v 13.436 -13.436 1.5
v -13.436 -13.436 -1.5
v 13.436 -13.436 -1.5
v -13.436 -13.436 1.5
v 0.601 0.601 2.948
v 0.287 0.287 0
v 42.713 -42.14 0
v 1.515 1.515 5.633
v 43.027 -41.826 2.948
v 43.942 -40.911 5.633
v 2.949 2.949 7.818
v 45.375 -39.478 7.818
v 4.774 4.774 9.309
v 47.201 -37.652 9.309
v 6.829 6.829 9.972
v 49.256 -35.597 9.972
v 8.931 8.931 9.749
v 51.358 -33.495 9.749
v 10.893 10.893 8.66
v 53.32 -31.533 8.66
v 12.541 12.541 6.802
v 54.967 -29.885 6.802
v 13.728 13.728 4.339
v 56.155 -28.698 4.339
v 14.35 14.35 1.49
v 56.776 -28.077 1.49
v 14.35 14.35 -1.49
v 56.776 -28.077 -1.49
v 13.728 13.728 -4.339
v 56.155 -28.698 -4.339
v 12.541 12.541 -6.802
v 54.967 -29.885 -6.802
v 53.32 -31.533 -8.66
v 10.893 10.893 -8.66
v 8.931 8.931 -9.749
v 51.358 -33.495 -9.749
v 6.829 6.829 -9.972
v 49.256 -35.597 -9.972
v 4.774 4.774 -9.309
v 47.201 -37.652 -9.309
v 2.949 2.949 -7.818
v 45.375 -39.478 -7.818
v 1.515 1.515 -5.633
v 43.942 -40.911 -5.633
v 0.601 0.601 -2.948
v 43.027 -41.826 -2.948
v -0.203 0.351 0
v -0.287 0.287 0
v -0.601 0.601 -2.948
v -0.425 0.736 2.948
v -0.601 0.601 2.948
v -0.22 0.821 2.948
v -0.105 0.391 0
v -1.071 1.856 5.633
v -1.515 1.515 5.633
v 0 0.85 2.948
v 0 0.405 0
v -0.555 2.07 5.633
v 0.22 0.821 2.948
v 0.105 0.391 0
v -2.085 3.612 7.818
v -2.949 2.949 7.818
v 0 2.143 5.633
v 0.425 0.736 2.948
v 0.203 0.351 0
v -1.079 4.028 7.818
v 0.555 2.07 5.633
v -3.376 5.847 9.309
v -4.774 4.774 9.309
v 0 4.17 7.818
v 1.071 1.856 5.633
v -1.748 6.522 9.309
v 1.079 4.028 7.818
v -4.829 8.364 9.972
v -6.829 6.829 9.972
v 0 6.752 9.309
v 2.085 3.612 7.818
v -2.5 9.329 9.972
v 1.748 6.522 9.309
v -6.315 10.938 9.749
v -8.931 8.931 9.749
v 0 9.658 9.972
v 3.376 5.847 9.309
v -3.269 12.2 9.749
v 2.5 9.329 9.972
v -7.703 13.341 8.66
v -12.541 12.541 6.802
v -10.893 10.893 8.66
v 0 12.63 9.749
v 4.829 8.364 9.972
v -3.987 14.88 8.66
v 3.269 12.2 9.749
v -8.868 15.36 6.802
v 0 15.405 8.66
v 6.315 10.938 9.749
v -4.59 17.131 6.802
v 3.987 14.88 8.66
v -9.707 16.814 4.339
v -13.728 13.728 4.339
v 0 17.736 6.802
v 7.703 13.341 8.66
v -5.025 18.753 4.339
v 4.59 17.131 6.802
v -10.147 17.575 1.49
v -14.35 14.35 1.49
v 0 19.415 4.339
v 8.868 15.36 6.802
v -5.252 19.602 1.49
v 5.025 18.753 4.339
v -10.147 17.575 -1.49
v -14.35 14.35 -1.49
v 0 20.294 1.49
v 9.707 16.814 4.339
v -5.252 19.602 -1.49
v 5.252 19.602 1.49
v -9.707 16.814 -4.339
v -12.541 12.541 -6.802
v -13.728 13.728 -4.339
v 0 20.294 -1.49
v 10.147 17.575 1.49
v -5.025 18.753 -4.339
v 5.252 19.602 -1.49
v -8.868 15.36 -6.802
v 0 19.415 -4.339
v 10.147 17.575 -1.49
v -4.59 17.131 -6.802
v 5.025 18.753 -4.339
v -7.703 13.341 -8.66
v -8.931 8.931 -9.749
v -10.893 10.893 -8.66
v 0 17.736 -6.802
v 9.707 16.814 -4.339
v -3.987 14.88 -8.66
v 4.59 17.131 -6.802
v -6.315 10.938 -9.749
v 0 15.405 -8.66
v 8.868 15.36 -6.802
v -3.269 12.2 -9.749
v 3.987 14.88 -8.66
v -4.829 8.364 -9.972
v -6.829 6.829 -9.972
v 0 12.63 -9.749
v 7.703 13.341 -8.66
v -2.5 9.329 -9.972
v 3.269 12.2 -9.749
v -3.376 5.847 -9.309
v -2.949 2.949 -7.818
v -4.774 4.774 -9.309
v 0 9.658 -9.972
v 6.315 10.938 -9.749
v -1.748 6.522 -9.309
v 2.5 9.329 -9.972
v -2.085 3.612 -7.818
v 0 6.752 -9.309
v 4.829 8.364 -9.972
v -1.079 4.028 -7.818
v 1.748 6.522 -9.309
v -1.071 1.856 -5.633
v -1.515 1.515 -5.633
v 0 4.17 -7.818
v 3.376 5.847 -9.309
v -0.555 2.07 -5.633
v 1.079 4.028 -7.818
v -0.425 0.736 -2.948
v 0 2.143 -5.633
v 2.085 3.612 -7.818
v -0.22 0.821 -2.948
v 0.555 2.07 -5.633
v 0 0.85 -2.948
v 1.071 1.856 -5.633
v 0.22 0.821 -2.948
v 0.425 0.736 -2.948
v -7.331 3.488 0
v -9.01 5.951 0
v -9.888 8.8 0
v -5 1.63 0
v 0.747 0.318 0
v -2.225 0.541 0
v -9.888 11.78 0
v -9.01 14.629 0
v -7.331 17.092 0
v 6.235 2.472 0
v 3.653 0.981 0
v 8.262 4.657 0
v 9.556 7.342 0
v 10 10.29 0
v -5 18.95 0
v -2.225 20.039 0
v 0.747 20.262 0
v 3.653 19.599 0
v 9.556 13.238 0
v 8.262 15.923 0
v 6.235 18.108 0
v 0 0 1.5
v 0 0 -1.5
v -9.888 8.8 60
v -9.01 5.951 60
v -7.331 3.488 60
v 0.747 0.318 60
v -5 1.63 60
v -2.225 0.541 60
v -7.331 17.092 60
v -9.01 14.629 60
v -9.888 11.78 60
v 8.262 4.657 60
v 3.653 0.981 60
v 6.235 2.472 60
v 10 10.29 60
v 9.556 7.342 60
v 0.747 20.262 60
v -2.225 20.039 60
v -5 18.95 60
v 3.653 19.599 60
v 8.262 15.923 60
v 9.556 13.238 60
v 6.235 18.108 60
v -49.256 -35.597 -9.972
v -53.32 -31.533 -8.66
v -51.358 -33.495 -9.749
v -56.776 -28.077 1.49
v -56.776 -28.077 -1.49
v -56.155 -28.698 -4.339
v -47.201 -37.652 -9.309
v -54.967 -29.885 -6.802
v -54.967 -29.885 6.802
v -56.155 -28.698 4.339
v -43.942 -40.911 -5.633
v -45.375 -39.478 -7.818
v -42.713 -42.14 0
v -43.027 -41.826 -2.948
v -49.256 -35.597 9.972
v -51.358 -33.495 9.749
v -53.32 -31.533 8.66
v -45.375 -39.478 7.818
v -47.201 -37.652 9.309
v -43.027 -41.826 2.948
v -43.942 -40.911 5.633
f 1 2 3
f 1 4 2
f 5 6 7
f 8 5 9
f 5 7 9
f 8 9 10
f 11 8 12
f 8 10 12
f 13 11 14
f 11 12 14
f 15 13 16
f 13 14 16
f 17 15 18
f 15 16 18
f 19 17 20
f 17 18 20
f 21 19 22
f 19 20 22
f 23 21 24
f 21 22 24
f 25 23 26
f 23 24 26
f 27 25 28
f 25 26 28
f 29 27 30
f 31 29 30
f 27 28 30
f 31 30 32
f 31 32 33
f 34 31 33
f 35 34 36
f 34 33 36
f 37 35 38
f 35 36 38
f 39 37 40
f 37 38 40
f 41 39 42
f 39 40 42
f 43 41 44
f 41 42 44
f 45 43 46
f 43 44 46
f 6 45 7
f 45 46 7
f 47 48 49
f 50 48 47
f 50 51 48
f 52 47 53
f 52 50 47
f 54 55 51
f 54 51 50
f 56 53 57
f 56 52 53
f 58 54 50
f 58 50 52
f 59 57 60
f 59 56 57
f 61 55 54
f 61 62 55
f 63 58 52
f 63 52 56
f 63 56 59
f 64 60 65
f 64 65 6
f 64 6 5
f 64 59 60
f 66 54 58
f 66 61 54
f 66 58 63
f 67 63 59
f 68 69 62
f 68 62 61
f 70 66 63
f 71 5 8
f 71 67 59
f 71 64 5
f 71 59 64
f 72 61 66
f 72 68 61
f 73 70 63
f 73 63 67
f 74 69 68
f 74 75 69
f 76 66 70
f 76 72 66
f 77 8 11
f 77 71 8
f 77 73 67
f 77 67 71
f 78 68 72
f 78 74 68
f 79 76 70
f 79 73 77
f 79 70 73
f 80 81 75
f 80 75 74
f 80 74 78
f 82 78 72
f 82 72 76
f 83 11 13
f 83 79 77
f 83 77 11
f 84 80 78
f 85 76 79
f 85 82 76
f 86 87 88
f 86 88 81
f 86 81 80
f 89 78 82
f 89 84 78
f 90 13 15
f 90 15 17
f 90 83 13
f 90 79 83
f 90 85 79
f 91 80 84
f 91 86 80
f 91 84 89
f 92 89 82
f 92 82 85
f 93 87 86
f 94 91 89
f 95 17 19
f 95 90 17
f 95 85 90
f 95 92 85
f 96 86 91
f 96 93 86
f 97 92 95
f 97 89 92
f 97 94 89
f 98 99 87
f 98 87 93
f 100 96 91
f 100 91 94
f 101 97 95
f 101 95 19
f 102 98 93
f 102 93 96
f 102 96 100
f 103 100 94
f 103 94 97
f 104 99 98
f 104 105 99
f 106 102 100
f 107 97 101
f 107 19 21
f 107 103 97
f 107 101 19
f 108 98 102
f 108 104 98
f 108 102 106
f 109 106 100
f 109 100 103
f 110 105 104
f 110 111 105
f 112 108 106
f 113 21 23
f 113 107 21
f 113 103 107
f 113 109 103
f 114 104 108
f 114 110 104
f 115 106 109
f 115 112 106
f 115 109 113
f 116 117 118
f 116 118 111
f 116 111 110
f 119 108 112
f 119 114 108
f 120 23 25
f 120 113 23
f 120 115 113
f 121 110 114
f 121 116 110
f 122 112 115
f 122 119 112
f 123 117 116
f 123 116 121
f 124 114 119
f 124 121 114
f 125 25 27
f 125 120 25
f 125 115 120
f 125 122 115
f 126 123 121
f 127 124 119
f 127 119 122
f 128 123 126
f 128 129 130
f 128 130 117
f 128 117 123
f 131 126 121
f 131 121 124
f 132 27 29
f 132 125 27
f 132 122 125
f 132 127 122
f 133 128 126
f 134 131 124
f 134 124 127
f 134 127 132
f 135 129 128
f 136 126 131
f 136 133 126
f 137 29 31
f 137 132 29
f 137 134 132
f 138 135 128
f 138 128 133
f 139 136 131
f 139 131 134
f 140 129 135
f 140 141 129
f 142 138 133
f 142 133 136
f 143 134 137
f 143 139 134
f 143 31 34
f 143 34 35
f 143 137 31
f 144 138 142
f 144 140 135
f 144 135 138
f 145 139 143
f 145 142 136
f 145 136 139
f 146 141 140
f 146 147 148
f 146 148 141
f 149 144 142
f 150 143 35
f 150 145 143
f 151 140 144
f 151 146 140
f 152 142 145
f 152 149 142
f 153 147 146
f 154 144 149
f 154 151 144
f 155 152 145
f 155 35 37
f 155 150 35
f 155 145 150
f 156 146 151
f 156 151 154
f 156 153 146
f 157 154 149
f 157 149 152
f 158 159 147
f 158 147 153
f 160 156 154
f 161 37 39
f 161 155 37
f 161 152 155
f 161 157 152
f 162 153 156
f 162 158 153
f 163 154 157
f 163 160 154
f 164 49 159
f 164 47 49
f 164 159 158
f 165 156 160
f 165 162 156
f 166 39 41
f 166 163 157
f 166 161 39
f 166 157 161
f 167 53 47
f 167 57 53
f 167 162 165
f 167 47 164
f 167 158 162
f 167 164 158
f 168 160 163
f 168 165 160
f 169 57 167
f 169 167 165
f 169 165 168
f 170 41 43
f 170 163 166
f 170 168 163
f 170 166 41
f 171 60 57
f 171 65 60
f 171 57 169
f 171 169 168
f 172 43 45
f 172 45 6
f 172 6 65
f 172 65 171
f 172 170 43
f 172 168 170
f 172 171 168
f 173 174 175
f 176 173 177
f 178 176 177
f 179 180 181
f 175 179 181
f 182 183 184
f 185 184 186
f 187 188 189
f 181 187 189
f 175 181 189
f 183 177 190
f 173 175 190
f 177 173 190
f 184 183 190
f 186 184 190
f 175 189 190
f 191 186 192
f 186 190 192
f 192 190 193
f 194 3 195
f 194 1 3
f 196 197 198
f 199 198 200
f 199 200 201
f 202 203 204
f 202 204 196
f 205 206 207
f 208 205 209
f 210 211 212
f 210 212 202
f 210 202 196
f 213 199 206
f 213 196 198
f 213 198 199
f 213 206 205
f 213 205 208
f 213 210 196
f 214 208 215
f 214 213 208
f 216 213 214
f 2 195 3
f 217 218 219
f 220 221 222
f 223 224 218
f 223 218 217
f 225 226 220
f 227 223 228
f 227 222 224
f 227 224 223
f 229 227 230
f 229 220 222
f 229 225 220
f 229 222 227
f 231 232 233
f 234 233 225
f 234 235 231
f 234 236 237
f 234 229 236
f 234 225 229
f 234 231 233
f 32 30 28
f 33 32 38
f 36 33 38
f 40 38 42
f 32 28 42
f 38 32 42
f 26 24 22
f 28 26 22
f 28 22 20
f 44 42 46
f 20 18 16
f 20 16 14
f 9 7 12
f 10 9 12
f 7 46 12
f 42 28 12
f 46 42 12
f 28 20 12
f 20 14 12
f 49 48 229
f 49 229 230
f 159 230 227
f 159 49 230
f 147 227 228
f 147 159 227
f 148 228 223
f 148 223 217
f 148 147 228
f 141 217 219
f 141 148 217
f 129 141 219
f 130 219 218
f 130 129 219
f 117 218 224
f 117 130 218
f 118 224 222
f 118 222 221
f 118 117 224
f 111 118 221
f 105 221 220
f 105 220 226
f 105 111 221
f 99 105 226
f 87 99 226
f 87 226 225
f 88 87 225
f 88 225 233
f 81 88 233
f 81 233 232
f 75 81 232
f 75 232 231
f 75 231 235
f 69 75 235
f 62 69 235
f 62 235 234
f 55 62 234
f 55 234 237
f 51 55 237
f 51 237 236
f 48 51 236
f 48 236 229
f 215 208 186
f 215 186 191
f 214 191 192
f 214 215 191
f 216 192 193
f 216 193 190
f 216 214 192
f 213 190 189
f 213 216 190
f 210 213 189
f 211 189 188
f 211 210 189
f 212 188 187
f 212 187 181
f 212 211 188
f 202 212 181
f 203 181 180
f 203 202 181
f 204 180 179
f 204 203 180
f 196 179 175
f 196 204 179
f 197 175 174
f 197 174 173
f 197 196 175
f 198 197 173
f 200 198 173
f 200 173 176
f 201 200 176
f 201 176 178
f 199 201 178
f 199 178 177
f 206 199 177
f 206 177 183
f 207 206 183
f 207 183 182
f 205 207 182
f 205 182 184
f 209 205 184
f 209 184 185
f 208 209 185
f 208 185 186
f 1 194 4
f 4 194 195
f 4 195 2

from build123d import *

# Parameters (mm, degrees)
F6_R     = 10
F2_R     = 10
F9_DEPTH = 1.5


with BuildPart() as f7:
    # F7: sweep along a path in F4
    with BuildLine(Plane.XZ.offset(-10)) as f7_path:
        Line((0, 0), (0, 60))
    # F6 (on offset) → F7 (sweep)
    with BuildSketch(Plane.XY.offset(60)):
        with Locations((0, 10.290014)):
            Circle(F6_R)
    sweep(path=f7_path.line)


with BuildPart() as f8:
    # F8: sweep along a path in F0
    with BuildLine(Plane.XY) as f8_path:
        Line((-49.497475, -35.355339), (-7.071068, 7.071068))
        ThreePointArc((-7.071068, 7.071068), (0, 10), (7.071068, 7.071068))
        Line((7.071068, 7.071068), (49.497475, -35.355339))
    # F2 (on face) → F8 (sweep)
    with BuildSketch(Plane(origin=(-42.426407, -42.426407, 0), x_dir=(0.707107, -0.707107, 0), z_dir=(-0.707107, -0.707107, 0))):
        with Locations((-10.405264, 0)):
            Circle(F2_R)
    sweep(path=f8_path.line)


with BuildPart() as f9:
    # F0 (on Top) → F9 (new body, symmetric)
    with BuildSketch(Plane.XY):
        Polygon((13.435555, -13.435555), (0, 0), (-13.435555, -13.435555), align=None)
    extrude(amount=F9_DEPTH, both=True)


solid = Compound([f7.part, f8.part, f9.part])
